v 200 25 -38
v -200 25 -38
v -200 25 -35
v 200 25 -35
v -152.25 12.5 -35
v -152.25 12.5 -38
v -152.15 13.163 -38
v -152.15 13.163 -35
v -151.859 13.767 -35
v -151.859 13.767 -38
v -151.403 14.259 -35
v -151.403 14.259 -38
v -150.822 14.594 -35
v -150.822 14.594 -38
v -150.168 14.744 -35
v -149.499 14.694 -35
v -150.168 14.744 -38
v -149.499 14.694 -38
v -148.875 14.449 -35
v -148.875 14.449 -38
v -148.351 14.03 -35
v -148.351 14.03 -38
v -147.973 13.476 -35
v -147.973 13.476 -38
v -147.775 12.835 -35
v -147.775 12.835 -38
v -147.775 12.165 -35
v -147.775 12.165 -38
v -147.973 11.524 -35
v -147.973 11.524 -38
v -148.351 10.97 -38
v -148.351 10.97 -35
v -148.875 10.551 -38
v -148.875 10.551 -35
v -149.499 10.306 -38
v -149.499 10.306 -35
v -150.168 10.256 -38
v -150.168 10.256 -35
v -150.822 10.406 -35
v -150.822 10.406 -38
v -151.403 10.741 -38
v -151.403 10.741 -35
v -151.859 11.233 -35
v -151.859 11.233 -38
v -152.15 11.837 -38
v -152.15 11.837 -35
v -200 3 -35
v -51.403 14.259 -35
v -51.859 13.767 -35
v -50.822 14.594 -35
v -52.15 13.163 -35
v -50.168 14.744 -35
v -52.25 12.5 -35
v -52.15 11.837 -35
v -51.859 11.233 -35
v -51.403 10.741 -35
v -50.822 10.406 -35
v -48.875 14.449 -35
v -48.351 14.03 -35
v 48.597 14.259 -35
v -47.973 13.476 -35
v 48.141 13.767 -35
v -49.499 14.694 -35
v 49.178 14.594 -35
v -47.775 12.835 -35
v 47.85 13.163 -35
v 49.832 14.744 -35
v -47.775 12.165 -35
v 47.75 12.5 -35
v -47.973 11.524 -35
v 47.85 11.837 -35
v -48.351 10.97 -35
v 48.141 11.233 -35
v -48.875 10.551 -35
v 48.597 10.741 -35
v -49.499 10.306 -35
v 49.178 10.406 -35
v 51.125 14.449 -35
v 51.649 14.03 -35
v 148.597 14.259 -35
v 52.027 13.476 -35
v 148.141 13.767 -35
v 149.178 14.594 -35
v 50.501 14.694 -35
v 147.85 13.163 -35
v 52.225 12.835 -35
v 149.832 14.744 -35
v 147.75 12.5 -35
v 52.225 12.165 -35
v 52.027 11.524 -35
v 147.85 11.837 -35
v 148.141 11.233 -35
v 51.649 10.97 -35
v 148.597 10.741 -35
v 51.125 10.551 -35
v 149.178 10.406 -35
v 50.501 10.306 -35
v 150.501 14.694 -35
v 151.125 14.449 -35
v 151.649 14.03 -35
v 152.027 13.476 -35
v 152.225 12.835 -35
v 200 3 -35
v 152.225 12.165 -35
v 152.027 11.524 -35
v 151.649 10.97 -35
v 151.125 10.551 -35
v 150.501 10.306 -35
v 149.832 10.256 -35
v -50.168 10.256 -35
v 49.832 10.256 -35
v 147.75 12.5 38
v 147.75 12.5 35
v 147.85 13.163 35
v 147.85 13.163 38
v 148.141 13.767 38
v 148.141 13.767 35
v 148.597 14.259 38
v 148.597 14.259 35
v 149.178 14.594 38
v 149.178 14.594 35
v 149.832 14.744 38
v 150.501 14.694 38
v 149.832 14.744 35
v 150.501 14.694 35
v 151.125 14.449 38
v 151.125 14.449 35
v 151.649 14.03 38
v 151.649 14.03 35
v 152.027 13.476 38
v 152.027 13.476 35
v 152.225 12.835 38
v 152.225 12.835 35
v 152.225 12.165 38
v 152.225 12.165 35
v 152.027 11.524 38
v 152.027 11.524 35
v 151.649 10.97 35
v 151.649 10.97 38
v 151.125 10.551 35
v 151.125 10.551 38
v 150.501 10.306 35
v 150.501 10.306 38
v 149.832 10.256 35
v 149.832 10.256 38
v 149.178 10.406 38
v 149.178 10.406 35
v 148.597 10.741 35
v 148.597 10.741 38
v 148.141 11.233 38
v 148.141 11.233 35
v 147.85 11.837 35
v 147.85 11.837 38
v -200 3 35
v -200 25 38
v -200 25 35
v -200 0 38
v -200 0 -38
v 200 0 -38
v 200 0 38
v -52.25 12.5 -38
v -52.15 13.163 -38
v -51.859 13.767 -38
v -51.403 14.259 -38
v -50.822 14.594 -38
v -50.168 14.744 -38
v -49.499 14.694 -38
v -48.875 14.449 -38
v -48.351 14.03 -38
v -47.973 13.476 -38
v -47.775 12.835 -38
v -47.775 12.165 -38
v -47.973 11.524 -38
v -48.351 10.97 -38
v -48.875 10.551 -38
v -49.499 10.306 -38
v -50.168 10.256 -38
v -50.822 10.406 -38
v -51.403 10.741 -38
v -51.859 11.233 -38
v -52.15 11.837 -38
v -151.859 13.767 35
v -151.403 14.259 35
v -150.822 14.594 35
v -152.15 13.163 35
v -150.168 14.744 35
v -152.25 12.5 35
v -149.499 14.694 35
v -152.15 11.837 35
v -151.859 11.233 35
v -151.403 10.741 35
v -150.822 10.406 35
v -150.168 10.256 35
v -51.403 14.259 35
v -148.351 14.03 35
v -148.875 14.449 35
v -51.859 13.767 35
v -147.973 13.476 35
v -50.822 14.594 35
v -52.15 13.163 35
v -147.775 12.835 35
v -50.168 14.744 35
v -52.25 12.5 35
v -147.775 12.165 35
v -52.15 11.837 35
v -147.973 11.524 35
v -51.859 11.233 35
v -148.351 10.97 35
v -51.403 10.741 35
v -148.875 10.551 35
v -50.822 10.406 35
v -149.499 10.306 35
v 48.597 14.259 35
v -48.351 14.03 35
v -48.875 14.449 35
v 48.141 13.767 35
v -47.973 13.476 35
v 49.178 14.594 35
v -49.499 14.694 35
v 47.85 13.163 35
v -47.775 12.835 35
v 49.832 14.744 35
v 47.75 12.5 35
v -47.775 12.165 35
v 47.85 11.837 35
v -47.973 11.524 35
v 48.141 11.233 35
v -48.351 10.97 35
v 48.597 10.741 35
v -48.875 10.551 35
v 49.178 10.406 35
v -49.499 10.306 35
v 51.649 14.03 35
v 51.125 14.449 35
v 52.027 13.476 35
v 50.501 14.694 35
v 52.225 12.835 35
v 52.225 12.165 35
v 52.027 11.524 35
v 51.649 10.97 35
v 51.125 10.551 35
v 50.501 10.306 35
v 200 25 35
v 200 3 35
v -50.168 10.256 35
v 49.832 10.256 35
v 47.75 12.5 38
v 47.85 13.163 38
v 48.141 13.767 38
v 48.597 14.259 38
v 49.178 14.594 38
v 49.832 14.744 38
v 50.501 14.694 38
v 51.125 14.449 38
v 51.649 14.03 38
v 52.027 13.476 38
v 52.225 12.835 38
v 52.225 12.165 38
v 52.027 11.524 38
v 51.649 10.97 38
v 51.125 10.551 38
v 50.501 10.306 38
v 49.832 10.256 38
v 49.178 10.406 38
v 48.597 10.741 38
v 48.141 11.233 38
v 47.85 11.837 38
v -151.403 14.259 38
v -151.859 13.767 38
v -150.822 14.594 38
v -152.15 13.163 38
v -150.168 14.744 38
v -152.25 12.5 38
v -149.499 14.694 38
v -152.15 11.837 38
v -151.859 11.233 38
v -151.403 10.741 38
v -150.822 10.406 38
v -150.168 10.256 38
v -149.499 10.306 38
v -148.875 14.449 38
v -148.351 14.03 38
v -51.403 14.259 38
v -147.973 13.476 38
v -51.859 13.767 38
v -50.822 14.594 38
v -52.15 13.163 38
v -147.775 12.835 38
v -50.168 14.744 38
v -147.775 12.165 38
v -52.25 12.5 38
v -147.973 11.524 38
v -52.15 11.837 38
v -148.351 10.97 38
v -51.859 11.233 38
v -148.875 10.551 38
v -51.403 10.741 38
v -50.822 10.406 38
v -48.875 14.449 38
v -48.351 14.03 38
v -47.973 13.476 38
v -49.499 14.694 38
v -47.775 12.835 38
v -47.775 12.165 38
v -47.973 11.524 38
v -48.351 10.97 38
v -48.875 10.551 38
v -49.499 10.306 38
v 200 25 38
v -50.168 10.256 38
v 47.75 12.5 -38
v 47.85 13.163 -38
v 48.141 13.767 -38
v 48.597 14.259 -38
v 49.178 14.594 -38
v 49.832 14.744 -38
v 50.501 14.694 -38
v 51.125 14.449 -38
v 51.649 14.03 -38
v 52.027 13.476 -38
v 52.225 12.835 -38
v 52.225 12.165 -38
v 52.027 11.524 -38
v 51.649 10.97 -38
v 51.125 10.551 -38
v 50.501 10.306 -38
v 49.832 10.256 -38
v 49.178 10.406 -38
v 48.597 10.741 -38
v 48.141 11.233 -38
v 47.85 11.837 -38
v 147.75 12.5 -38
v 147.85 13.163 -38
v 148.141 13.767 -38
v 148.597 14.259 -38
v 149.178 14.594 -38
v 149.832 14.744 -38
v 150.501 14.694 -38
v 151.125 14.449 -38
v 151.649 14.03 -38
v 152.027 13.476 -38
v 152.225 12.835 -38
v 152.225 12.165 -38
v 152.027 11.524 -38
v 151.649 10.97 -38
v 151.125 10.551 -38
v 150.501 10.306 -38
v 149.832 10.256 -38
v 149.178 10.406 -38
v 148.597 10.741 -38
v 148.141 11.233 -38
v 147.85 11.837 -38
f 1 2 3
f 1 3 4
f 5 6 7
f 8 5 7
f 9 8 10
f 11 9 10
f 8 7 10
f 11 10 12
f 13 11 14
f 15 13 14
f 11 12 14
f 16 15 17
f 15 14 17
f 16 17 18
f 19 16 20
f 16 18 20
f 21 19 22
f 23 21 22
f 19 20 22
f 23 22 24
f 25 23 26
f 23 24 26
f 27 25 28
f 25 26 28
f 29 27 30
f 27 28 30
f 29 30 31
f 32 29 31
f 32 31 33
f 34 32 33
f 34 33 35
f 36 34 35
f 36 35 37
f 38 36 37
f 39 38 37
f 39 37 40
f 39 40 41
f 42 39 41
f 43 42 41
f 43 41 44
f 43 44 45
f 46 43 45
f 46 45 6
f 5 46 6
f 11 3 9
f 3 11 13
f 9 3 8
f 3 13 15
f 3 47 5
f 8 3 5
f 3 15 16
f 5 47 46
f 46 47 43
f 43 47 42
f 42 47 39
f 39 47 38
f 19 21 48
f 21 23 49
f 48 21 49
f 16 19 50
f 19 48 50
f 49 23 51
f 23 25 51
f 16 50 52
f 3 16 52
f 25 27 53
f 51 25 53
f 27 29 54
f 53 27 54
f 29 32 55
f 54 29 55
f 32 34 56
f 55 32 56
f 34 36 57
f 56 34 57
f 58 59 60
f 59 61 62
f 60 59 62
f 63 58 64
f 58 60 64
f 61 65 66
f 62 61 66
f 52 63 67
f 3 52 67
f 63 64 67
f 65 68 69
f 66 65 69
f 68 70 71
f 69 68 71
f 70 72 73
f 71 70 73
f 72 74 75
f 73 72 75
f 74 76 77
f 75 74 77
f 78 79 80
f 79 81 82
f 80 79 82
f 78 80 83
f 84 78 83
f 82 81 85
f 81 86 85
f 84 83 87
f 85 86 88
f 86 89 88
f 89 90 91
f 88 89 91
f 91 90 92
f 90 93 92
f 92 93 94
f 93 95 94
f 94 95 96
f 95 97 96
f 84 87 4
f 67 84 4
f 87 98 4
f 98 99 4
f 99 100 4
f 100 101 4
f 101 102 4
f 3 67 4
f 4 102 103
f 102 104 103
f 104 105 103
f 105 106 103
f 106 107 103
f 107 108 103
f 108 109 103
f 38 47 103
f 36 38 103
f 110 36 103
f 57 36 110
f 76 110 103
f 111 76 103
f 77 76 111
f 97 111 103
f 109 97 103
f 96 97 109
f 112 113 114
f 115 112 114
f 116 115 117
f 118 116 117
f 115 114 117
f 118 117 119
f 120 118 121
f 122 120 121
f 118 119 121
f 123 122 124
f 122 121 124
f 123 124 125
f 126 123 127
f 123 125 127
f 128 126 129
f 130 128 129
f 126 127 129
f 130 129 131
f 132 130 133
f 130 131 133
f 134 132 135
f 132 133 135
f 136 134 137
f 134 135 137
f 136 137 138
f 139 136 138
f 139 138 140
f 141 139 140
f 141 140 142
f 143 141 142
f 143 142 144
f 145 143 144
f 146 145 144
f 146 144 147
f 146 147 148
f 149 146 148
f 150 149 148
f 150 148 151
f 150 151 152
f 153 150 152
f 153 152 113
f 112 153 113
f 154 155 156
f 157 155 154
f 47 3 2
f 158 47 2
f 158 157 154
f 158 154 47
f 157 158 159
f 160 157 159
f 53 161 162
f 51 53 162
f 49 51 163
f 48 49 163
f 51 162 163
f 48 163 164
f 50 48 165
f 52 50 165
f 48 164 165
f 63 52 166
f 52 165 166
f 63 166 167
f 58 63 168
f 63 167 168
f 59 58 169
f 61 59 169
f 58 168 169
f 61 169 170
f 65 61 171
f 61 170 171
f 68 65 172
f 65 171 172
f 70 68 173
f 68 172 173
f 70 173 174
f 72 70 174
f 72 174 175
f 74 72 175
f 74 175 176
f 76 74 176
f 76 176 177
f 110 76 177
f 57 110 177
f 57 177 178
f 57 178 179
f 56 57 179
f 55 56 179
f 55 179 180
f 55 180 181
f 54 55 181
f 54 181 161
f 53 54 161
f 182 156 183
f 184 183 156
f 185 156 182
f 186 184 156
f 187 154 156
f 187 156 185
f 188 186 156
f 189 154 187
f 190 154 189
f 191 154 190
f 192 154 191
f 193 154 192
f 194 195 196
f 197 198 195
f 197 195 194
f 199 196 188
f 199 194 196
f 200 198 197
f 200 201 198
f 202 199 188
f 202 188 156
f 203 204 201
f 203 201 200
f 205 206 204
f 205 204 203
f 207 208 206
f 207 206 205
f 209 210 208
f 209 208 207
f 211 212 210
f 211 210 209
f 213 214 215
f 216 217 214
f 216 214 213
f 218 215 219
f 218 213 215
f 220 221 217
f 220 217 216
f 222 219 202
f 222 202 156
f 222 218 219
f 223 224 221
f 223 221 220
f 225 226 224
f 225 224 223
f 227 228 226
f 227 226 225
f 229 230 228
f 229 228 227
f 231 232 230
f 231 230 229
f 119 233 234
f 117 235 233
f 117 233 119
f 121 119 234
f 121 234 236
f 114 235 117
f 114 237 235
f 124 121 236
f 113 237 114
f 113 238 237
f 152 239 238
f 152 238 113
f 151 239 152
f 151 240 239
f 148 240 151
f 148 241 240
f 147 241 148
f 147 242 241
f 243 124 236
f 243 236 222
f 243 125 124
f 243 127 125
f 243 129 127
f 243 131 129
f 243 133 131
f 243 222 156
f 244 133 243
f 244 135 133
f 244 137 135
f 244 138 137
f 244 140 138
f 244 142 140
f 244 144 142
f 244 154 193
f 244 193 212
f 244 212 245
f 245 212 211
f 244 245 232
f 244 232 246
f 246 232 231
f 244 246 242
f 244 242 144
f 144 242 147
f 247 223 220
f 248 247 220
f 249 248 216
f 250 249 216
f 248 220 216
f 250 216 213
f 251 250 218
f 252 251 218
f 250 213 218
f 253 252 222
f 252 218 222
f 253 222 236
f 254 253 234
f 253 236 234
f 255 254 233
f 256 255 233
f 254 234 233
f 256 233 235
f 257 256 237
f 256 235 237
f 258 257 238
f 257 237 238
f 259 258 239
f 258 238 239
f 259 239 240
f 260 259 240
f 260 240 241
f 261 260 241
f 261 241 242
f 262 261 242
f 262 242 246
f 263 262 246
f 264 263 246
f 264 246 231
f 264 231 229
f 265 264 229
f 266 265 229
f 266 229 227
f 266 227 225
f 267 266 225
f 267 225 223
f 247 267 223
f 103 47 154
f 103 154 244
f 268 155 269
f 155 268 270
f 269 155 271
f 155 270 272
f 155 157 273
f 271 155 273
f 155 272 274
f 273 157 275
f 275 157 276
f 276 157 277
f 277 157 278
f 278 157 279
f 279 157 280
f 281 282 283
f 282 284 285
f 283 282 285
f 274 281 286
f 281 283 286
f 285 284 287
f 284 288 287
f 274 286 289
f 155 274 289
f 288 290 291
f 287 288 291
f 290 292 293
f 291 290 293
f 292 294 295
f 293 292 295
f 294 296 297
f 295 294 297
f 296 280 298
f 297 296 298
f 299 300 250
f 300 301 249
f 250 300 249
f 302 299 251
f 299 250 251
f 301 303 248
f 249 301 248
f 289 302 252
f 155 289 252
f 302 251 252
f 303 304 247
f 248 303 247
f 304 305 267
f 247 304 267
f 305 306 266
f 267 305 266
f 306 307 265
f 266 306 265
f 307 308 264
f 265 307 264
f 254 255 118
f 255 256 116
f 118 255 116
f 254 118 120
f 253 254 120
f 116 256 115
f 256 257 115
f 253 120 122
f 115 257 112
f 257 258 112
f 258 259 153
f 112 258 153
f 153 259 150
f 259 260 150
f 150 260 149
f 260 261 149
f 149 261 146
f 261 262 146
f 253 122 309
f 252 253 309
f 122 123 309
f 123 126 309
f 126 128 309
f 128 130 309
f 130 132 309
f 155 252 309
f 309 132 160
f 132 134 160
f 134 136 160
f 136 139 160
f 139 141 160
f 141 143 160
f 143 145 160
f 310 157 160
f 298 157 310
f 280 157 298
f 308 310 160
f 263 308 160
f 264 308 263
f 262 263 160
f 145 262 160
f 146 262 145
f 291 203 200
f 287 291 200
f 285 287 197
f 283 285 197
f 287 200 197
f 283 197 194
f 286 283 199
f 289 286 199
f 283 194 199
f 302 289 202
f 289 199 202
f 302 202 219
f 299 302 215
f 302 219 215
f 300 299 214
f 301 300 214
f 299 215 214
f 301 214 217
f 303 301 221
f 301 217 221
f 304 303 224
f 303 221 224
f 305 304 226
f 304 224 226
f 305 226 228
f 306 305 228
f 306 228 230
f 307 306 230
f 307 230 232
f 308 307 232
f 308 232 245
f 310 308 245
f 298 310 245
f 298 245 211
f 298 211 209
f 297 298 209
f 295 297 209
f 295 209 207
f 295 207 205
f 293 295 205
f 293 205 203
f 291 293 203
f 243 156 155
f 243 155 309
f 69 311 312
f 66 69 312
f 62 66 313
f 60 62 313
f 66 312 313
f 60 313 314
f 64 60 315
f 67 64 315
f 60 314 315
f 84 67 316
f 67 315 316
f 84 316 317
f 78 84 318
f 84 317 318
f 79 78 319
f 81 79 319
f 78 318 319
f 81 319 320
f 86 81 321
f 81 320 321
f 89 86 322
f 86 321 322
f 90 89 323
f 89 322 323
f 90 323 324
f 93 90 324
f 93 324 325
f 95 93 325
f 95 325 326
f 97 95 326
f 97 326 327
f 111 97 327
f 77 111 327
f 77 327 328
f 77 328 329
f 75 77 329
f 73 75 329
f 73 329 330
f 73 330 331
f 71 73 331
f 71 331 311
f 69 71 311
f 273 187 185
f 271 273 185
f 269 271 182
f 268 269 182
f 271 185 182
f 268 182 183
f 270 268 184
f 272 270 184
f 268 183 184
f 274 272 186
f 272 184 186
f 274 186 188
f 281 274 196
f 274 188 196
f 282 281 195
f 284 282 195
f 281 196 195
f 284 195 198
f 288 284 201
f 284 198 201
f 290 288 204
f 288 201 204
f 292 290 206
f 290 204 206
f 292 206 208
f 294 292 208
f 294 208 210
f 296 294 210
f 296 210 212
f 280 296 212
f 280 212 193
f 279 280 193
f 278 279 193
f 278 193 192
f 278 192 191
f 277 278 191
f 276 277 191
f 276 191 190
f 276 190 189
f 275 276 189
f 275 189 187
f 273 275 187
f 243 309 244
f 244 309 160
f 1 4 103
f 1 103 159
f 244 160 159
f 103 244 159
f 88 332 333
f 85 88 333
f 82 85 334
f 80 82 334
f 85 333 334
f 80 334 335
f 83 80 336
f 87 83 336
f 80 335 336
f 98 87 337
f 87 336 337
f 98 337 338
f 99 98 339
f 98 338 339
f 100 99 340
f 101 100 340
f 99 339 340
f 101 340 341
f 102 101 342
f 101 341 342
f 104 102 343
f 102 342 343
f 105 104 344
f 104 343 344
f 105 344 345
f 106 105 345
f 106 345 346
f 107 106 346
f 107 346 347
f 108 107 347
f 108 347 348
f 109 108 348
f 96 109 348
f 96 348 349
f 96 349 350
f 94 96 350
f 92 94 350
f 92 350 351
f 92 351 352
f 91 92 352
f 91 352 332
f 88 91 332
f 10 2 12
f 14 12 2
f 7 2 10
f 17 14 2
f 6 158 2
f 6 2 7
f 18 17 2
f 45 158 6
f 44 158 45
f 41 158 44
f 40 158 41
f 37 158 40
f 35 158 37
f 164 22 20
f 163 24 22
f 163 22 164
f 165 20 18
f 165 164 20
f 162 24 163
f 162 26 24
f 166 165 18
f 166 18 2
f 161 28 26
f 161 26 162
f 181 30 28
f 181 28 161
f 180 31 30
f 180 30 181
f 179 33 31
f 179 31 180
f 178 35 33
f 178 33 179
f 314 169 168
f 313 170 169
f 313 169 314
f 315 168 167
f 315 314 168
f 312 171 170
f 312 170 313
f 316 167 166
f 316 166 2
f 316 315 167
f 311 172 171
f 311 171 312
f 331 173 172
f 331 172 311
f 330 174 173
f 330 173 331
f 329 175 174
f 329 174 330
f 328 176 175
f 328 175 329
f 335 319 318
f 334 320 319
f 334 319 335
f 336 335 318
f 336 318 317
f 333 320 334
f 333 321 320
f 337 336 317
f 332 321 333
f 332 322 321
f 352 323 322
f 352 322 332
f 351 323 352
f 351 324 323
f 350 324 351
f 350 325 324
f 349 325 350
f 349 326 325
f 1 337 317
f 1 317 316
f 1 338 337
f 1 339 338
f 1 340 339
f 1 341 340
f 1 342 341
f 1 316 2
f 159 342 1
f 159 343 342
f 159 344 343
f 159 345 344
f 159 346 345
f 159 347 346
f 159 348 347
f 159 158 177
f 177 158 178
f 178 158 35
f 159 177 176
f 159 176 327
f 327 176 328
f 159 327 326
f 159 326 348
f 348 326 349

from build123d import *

# Parameters (mm, degrees)
ESBO_O1_W                = 400
ESBO_O1_H                = 76
RESSALTO_EXTRUS_O1_DEPTH = 3
ESBO_O2_W                = 400
ESBO_O2_H                = 3
RESSALTO_EXTRUS_O2_DEPTH = 22
FURO_COM_FOLGA_DE_M41_D  = 4.5


with BuildPart() as part:
    # Esboço1 → Ressalto-extrusão1 (new body)
    with BuildSketch(Plane(origin=(0, 0, 0), x_dir=(1, 0, 0), z_dir=(0, 1, 0))):
        Rectangle(ESBO_O1_W, ESBO_O1_H)
    extrude(amount=RESSALTO_EXTRUS_O1_DEPTH)

    # Esboço2 → Ressalto-extrusão2 (add)
    with BuildSketch(Plane(origin=(0, 3, 0), x_dir=(1, 0, 0), z_dir=(0, 1, 0))):
        with Locations((0, 36.5)):
            Rectangle(ESBO_O2_W, ESBO_O2_H)
        with Locations((0, -36.5)):
            Rectangle(ESBO_O2_W, ESBO_O2_H)
    extrude(amount=RESSALTO_EXTRUS_O2_DEPTH)

    # Furo com folga de M41 (through all)
    with Locations(Plane(origin=(-150, 12.5, 38), x_dir=(1, 0, 0), z_dir=(0, 0, 1))):
        with Locations((0, 0), (300, 0), (100, 0), (200, 0)):
            Hole(FURO_COM_FOLGA_DE_M41_D / 2)


solid = part.part
